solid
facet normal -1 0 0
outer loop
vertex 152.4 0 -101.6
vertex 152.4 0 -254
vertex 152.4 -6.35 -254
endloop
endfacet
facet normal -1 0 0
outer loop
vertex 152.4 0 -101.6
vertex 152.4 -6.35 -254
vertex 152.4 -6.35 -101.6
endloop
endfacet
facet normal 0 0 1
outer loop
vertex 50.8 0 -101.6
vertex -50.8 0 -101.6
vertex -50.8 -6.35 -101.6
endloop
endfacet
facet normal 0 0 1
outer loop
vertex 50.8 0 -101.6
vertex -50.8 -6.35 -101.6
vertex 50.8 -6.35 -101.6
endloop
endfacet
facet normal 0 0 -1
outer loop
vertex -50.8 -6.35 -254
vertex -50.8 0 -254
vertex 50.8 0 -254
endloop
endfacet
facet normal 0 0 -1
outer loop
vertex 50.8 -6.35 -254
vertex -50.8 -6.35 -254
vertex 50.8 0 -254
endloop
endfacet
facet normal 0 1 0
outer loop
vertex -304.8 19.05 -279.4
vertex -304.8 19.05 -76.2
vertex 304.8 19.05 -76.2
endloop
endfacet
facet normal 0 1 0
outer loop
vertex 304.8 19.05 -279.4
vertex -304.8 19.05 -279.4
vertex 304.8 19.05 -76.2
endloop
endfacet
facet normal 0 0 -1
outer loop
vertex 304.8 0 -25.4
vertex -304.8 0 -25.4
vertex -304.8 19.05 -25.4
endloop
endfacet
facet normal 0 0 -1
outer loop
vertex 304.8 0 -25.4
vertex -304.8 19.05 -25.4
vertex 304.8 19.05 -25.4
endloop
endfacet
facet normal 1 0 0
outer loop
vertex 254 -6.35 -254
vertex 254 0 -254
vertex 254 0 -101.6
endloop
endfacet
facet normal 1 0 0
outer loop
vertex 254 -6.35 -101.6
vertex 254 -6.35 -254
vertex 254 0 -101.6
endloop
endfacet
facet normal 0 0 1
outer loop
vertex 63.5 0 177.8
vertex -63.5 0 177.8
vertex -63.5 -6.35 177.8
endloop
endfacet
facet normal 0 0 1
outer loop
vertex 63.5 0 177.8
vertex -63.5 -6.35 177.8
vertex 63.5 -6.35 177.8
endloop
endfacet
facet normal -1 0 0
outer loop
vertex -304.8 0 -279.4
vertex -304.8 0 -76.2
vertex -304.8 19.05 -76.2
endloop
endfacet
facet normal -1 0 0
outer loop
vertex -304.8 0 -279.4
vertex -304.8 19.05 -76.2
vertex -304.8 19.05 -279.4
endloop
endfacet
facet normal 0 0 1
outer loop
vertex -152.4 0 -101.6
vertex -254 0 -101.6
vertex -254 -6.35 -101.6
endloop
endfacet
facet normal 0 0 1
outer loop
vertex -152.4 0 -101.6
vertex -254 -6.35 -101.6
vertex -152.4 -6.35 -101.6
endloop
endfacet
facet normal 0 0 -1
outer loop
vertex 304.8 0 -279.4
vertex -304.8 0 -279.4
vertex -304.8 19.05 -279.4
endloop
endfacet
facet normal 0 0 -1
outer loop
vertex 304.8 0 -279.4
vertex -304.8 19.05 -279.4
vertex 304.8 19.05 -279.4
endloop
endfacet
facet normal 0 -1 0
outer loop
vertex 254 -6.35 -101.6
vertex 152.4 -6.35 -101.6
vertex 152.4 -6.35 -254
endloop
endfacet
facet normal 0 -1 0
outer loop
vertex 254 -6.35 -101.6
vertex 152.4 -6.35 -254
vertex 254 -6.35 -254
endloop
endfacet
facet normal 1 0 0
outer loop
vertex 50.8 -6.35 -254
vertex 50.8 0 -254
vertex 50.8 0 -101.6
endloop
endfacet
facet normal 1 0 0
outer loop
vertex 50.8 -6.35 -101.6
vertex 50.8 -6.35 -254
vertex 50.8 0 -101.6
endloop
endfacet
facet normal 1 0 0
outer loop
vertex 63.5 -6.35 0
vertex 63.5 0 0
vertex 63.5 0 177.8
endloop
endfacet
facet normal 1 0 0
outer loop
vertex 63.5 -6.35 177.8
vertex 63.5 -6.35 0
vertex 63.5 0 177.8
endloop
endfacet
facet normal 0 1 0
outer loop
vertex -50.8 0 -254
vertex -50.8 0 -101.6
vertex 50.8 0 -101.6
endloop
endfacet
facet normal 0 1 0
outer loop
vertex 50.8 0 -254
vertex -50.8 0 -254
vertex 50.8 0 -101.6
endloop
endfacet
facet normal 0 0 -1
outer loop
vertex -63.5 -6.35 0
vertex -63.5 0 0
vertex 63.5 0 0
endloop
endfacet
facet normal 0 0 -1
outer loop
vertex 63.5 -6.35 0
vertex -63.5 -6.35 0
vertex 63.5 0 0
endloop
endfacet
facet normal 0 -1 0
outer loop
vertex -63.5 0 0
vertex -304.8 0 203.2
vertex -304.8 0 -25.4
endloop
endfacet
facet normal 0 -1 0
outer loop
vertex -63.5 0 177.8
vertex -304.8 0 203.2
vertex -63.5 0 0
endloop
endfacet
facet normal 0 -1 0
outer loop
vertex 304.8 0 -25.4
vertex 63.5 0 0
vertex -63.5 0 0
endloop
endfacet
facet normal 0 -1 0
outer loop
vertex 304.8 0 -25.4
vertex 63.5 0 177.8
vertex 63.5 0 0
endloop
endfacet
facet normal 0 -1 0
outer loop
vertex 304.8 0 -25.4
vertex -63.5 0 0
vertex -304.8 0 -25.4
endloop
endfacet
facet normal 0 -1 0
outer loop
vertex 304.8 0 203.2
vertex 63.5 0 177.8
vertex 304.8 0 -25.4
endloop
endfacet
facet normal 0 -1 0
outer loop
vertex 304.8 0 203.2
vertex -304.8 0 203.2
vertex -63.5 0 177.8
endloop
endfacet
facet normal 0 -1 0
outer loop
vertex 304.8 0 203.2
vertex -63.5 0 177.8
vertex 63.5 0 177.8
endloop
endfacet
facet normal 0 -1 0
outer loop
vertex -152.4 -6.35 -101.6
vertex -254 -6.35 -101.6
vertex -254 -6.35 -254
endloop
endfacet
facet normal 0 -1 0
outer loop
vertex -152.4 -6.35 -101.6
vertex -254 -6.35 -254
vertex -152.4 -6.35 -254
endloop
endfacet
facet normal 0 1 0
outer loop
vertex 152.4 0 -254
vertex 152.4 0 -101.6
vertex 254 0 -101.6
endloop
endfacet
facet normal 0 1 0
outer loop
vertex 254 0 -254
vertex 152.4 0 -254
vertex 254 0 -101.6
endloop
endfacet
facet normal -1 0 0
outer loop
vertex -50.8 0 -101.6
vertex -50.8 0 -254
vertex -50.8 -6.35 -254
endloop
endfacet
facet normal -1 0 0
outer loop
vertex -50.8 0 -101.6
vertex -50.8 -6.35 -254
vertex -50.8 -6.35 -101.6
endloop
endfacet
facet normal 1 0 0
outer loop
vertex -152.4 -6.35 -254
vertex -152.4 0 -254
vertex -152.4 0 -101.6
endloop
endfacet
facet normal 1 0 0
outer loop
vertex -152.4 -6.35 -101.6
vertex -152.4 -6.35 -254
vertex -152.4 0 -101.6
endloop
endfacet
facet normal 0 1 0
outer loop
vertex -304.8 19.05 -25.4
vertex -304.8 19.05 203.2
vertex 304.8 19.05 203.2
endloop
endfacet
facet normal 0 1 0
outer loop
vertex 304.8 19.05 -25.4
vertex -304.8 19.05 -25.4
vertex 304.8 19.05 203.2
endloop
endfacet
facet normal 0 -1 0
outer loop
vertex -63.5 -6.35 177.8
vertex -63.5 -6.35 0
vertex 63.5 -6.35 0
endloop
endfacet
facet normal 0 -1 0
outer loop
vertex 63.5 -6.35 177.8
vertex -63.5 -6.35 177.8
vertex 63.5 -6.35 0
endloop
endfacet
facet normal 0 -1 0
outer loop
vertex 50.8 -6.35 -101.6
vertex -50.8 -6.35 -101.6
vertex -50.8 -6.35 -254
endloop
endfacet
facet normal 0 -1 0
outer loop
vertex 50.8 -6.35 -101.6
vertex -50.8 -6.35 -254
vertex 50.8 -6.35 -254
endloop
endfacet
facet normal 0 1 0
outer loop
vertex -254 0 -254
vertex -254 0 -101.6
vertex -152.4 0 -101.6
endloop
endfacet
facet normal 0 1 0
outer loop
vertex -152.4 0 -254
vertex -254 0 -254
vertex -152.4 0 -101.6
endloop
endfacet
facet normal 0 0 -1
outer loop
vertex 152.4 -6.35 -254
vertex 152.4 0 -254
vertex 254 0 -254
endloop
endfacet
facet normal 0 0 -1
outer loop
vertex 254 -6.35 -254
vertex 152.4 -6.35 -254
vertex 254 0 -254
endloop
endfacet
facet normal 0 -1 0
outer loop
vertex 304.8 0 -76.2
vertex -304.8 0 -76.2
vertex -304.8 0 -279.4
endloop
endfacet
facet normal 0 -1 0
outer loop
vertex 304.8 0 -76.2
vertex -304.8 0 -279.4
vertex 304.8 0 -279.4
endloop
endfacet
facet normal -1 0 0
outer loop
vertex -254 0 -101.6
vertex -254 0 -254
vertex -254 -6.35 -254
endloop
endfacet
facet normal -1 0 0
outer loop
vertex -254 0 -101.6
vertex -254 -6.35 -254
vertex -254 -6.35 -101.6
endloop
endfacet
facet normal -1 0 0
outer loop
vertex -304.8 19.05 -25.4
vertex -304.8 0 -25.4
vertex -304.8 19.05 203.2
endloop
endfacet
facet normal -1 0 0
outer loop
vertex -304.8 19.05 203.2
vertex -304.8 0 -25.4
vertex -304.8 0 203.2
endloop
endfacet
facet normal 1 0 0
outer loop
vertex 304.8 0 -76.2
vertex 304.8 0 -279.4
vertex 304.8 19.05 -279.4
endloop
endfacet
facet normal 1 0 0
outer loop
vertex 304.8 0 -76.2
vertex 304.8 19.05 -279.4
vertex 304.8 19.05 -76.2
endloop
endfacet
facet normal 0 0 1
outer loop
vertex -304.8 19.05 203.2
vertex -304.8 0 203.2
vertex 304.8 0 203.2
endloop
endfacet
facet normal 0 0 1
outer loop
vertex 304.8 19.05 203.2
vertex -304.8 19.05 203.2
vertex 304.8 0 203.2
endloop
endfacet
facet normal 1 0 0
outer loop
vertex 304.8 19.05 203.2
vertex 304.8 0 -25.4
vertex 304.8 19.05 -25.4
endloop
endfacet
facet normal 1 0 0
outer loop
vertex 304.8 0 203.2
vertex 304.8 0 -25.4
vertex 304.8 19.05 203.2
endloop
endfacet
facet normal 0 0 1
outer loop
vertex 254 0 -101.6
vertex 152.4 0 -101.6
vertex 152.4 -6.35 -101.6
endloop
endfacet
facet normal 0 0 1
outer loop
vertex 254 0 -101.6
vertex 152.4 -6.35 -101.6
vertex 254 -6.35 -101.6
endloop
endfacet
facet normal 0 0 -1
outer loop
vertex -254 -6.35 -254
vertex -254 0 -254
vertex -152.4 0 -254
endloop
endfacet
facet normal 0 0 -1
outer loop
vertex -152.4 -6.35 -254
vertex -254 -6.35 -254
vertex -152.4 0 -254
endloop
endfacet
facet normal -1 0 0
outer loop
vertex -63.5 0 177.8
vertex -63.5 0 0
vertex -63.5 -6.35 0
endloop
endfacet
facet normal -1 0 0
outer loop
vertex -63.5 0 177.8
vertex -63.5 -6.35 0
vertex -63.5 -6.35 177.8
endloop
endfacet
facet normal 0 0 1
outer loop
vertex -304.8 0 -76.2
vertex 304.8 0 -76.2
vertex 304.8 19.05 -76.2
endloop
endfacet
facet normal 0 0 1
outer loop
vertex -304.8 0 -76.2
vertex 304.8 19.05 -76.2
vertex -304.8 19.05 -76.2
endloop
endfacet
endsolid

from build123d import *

# Parameters (mm, degrees)
F0_W     = 127
F0_H     = 177.8
F1_DEPTH = 6.35
F2_W     = 609.6
F2_H     = 228.6
F3_DEPTH = 19.05
F4_W     = 101.6
F4_H     = 152.4
F5_DEPTH = 6.35
F7_DEPTH = 19.05


with BuildPart() as f1:
    # F0 (on Front) → F1 (new body)
    with BuildSketch(Plane.XZ):
        with Locations((0, 88.9)):
            Rectangle(F0_W, F0_H)
    extrude(amount=F1_DEPTH)

    # F2 (on Front) → F3 (join)
    with BuildSketch(Plane.XZ):
        with Locations((0, 88.9)):
            Rectangle(F2_W, F2_H)
    extrude(amount=-F3_DEPTH)


with BuildPart() as f5:
    # F4 (on Front) → F5 (new body)
    with BuildSketch(Plane.XZ):
        with Locations((0, -177.8)):
            Rectangle(F4_W, F4_H)
        with Locations((203.2, -177.8)):
            Rectangle(F4_W, F4_H)
        with Locations((-203.2, -177.8)):
            Rectangle(F4_W, F4_H)
    extrude(amount=F5_DEPTH)


with BuildPart() as f7:
    # F6 (on Front) → F7 (new body)
    with BuildSketch(Plane.XZ):
        Polygon((0, -76.2), (-304.8, -76.2), (-304.8, -177.8), (-304.8, -279.4), (304.8, -279.4), (304.8, -76.2), align=None)
    extrude(amount=-F7_DEPTH)


solid = Compound([f1.part, f5.part, f7.part])
